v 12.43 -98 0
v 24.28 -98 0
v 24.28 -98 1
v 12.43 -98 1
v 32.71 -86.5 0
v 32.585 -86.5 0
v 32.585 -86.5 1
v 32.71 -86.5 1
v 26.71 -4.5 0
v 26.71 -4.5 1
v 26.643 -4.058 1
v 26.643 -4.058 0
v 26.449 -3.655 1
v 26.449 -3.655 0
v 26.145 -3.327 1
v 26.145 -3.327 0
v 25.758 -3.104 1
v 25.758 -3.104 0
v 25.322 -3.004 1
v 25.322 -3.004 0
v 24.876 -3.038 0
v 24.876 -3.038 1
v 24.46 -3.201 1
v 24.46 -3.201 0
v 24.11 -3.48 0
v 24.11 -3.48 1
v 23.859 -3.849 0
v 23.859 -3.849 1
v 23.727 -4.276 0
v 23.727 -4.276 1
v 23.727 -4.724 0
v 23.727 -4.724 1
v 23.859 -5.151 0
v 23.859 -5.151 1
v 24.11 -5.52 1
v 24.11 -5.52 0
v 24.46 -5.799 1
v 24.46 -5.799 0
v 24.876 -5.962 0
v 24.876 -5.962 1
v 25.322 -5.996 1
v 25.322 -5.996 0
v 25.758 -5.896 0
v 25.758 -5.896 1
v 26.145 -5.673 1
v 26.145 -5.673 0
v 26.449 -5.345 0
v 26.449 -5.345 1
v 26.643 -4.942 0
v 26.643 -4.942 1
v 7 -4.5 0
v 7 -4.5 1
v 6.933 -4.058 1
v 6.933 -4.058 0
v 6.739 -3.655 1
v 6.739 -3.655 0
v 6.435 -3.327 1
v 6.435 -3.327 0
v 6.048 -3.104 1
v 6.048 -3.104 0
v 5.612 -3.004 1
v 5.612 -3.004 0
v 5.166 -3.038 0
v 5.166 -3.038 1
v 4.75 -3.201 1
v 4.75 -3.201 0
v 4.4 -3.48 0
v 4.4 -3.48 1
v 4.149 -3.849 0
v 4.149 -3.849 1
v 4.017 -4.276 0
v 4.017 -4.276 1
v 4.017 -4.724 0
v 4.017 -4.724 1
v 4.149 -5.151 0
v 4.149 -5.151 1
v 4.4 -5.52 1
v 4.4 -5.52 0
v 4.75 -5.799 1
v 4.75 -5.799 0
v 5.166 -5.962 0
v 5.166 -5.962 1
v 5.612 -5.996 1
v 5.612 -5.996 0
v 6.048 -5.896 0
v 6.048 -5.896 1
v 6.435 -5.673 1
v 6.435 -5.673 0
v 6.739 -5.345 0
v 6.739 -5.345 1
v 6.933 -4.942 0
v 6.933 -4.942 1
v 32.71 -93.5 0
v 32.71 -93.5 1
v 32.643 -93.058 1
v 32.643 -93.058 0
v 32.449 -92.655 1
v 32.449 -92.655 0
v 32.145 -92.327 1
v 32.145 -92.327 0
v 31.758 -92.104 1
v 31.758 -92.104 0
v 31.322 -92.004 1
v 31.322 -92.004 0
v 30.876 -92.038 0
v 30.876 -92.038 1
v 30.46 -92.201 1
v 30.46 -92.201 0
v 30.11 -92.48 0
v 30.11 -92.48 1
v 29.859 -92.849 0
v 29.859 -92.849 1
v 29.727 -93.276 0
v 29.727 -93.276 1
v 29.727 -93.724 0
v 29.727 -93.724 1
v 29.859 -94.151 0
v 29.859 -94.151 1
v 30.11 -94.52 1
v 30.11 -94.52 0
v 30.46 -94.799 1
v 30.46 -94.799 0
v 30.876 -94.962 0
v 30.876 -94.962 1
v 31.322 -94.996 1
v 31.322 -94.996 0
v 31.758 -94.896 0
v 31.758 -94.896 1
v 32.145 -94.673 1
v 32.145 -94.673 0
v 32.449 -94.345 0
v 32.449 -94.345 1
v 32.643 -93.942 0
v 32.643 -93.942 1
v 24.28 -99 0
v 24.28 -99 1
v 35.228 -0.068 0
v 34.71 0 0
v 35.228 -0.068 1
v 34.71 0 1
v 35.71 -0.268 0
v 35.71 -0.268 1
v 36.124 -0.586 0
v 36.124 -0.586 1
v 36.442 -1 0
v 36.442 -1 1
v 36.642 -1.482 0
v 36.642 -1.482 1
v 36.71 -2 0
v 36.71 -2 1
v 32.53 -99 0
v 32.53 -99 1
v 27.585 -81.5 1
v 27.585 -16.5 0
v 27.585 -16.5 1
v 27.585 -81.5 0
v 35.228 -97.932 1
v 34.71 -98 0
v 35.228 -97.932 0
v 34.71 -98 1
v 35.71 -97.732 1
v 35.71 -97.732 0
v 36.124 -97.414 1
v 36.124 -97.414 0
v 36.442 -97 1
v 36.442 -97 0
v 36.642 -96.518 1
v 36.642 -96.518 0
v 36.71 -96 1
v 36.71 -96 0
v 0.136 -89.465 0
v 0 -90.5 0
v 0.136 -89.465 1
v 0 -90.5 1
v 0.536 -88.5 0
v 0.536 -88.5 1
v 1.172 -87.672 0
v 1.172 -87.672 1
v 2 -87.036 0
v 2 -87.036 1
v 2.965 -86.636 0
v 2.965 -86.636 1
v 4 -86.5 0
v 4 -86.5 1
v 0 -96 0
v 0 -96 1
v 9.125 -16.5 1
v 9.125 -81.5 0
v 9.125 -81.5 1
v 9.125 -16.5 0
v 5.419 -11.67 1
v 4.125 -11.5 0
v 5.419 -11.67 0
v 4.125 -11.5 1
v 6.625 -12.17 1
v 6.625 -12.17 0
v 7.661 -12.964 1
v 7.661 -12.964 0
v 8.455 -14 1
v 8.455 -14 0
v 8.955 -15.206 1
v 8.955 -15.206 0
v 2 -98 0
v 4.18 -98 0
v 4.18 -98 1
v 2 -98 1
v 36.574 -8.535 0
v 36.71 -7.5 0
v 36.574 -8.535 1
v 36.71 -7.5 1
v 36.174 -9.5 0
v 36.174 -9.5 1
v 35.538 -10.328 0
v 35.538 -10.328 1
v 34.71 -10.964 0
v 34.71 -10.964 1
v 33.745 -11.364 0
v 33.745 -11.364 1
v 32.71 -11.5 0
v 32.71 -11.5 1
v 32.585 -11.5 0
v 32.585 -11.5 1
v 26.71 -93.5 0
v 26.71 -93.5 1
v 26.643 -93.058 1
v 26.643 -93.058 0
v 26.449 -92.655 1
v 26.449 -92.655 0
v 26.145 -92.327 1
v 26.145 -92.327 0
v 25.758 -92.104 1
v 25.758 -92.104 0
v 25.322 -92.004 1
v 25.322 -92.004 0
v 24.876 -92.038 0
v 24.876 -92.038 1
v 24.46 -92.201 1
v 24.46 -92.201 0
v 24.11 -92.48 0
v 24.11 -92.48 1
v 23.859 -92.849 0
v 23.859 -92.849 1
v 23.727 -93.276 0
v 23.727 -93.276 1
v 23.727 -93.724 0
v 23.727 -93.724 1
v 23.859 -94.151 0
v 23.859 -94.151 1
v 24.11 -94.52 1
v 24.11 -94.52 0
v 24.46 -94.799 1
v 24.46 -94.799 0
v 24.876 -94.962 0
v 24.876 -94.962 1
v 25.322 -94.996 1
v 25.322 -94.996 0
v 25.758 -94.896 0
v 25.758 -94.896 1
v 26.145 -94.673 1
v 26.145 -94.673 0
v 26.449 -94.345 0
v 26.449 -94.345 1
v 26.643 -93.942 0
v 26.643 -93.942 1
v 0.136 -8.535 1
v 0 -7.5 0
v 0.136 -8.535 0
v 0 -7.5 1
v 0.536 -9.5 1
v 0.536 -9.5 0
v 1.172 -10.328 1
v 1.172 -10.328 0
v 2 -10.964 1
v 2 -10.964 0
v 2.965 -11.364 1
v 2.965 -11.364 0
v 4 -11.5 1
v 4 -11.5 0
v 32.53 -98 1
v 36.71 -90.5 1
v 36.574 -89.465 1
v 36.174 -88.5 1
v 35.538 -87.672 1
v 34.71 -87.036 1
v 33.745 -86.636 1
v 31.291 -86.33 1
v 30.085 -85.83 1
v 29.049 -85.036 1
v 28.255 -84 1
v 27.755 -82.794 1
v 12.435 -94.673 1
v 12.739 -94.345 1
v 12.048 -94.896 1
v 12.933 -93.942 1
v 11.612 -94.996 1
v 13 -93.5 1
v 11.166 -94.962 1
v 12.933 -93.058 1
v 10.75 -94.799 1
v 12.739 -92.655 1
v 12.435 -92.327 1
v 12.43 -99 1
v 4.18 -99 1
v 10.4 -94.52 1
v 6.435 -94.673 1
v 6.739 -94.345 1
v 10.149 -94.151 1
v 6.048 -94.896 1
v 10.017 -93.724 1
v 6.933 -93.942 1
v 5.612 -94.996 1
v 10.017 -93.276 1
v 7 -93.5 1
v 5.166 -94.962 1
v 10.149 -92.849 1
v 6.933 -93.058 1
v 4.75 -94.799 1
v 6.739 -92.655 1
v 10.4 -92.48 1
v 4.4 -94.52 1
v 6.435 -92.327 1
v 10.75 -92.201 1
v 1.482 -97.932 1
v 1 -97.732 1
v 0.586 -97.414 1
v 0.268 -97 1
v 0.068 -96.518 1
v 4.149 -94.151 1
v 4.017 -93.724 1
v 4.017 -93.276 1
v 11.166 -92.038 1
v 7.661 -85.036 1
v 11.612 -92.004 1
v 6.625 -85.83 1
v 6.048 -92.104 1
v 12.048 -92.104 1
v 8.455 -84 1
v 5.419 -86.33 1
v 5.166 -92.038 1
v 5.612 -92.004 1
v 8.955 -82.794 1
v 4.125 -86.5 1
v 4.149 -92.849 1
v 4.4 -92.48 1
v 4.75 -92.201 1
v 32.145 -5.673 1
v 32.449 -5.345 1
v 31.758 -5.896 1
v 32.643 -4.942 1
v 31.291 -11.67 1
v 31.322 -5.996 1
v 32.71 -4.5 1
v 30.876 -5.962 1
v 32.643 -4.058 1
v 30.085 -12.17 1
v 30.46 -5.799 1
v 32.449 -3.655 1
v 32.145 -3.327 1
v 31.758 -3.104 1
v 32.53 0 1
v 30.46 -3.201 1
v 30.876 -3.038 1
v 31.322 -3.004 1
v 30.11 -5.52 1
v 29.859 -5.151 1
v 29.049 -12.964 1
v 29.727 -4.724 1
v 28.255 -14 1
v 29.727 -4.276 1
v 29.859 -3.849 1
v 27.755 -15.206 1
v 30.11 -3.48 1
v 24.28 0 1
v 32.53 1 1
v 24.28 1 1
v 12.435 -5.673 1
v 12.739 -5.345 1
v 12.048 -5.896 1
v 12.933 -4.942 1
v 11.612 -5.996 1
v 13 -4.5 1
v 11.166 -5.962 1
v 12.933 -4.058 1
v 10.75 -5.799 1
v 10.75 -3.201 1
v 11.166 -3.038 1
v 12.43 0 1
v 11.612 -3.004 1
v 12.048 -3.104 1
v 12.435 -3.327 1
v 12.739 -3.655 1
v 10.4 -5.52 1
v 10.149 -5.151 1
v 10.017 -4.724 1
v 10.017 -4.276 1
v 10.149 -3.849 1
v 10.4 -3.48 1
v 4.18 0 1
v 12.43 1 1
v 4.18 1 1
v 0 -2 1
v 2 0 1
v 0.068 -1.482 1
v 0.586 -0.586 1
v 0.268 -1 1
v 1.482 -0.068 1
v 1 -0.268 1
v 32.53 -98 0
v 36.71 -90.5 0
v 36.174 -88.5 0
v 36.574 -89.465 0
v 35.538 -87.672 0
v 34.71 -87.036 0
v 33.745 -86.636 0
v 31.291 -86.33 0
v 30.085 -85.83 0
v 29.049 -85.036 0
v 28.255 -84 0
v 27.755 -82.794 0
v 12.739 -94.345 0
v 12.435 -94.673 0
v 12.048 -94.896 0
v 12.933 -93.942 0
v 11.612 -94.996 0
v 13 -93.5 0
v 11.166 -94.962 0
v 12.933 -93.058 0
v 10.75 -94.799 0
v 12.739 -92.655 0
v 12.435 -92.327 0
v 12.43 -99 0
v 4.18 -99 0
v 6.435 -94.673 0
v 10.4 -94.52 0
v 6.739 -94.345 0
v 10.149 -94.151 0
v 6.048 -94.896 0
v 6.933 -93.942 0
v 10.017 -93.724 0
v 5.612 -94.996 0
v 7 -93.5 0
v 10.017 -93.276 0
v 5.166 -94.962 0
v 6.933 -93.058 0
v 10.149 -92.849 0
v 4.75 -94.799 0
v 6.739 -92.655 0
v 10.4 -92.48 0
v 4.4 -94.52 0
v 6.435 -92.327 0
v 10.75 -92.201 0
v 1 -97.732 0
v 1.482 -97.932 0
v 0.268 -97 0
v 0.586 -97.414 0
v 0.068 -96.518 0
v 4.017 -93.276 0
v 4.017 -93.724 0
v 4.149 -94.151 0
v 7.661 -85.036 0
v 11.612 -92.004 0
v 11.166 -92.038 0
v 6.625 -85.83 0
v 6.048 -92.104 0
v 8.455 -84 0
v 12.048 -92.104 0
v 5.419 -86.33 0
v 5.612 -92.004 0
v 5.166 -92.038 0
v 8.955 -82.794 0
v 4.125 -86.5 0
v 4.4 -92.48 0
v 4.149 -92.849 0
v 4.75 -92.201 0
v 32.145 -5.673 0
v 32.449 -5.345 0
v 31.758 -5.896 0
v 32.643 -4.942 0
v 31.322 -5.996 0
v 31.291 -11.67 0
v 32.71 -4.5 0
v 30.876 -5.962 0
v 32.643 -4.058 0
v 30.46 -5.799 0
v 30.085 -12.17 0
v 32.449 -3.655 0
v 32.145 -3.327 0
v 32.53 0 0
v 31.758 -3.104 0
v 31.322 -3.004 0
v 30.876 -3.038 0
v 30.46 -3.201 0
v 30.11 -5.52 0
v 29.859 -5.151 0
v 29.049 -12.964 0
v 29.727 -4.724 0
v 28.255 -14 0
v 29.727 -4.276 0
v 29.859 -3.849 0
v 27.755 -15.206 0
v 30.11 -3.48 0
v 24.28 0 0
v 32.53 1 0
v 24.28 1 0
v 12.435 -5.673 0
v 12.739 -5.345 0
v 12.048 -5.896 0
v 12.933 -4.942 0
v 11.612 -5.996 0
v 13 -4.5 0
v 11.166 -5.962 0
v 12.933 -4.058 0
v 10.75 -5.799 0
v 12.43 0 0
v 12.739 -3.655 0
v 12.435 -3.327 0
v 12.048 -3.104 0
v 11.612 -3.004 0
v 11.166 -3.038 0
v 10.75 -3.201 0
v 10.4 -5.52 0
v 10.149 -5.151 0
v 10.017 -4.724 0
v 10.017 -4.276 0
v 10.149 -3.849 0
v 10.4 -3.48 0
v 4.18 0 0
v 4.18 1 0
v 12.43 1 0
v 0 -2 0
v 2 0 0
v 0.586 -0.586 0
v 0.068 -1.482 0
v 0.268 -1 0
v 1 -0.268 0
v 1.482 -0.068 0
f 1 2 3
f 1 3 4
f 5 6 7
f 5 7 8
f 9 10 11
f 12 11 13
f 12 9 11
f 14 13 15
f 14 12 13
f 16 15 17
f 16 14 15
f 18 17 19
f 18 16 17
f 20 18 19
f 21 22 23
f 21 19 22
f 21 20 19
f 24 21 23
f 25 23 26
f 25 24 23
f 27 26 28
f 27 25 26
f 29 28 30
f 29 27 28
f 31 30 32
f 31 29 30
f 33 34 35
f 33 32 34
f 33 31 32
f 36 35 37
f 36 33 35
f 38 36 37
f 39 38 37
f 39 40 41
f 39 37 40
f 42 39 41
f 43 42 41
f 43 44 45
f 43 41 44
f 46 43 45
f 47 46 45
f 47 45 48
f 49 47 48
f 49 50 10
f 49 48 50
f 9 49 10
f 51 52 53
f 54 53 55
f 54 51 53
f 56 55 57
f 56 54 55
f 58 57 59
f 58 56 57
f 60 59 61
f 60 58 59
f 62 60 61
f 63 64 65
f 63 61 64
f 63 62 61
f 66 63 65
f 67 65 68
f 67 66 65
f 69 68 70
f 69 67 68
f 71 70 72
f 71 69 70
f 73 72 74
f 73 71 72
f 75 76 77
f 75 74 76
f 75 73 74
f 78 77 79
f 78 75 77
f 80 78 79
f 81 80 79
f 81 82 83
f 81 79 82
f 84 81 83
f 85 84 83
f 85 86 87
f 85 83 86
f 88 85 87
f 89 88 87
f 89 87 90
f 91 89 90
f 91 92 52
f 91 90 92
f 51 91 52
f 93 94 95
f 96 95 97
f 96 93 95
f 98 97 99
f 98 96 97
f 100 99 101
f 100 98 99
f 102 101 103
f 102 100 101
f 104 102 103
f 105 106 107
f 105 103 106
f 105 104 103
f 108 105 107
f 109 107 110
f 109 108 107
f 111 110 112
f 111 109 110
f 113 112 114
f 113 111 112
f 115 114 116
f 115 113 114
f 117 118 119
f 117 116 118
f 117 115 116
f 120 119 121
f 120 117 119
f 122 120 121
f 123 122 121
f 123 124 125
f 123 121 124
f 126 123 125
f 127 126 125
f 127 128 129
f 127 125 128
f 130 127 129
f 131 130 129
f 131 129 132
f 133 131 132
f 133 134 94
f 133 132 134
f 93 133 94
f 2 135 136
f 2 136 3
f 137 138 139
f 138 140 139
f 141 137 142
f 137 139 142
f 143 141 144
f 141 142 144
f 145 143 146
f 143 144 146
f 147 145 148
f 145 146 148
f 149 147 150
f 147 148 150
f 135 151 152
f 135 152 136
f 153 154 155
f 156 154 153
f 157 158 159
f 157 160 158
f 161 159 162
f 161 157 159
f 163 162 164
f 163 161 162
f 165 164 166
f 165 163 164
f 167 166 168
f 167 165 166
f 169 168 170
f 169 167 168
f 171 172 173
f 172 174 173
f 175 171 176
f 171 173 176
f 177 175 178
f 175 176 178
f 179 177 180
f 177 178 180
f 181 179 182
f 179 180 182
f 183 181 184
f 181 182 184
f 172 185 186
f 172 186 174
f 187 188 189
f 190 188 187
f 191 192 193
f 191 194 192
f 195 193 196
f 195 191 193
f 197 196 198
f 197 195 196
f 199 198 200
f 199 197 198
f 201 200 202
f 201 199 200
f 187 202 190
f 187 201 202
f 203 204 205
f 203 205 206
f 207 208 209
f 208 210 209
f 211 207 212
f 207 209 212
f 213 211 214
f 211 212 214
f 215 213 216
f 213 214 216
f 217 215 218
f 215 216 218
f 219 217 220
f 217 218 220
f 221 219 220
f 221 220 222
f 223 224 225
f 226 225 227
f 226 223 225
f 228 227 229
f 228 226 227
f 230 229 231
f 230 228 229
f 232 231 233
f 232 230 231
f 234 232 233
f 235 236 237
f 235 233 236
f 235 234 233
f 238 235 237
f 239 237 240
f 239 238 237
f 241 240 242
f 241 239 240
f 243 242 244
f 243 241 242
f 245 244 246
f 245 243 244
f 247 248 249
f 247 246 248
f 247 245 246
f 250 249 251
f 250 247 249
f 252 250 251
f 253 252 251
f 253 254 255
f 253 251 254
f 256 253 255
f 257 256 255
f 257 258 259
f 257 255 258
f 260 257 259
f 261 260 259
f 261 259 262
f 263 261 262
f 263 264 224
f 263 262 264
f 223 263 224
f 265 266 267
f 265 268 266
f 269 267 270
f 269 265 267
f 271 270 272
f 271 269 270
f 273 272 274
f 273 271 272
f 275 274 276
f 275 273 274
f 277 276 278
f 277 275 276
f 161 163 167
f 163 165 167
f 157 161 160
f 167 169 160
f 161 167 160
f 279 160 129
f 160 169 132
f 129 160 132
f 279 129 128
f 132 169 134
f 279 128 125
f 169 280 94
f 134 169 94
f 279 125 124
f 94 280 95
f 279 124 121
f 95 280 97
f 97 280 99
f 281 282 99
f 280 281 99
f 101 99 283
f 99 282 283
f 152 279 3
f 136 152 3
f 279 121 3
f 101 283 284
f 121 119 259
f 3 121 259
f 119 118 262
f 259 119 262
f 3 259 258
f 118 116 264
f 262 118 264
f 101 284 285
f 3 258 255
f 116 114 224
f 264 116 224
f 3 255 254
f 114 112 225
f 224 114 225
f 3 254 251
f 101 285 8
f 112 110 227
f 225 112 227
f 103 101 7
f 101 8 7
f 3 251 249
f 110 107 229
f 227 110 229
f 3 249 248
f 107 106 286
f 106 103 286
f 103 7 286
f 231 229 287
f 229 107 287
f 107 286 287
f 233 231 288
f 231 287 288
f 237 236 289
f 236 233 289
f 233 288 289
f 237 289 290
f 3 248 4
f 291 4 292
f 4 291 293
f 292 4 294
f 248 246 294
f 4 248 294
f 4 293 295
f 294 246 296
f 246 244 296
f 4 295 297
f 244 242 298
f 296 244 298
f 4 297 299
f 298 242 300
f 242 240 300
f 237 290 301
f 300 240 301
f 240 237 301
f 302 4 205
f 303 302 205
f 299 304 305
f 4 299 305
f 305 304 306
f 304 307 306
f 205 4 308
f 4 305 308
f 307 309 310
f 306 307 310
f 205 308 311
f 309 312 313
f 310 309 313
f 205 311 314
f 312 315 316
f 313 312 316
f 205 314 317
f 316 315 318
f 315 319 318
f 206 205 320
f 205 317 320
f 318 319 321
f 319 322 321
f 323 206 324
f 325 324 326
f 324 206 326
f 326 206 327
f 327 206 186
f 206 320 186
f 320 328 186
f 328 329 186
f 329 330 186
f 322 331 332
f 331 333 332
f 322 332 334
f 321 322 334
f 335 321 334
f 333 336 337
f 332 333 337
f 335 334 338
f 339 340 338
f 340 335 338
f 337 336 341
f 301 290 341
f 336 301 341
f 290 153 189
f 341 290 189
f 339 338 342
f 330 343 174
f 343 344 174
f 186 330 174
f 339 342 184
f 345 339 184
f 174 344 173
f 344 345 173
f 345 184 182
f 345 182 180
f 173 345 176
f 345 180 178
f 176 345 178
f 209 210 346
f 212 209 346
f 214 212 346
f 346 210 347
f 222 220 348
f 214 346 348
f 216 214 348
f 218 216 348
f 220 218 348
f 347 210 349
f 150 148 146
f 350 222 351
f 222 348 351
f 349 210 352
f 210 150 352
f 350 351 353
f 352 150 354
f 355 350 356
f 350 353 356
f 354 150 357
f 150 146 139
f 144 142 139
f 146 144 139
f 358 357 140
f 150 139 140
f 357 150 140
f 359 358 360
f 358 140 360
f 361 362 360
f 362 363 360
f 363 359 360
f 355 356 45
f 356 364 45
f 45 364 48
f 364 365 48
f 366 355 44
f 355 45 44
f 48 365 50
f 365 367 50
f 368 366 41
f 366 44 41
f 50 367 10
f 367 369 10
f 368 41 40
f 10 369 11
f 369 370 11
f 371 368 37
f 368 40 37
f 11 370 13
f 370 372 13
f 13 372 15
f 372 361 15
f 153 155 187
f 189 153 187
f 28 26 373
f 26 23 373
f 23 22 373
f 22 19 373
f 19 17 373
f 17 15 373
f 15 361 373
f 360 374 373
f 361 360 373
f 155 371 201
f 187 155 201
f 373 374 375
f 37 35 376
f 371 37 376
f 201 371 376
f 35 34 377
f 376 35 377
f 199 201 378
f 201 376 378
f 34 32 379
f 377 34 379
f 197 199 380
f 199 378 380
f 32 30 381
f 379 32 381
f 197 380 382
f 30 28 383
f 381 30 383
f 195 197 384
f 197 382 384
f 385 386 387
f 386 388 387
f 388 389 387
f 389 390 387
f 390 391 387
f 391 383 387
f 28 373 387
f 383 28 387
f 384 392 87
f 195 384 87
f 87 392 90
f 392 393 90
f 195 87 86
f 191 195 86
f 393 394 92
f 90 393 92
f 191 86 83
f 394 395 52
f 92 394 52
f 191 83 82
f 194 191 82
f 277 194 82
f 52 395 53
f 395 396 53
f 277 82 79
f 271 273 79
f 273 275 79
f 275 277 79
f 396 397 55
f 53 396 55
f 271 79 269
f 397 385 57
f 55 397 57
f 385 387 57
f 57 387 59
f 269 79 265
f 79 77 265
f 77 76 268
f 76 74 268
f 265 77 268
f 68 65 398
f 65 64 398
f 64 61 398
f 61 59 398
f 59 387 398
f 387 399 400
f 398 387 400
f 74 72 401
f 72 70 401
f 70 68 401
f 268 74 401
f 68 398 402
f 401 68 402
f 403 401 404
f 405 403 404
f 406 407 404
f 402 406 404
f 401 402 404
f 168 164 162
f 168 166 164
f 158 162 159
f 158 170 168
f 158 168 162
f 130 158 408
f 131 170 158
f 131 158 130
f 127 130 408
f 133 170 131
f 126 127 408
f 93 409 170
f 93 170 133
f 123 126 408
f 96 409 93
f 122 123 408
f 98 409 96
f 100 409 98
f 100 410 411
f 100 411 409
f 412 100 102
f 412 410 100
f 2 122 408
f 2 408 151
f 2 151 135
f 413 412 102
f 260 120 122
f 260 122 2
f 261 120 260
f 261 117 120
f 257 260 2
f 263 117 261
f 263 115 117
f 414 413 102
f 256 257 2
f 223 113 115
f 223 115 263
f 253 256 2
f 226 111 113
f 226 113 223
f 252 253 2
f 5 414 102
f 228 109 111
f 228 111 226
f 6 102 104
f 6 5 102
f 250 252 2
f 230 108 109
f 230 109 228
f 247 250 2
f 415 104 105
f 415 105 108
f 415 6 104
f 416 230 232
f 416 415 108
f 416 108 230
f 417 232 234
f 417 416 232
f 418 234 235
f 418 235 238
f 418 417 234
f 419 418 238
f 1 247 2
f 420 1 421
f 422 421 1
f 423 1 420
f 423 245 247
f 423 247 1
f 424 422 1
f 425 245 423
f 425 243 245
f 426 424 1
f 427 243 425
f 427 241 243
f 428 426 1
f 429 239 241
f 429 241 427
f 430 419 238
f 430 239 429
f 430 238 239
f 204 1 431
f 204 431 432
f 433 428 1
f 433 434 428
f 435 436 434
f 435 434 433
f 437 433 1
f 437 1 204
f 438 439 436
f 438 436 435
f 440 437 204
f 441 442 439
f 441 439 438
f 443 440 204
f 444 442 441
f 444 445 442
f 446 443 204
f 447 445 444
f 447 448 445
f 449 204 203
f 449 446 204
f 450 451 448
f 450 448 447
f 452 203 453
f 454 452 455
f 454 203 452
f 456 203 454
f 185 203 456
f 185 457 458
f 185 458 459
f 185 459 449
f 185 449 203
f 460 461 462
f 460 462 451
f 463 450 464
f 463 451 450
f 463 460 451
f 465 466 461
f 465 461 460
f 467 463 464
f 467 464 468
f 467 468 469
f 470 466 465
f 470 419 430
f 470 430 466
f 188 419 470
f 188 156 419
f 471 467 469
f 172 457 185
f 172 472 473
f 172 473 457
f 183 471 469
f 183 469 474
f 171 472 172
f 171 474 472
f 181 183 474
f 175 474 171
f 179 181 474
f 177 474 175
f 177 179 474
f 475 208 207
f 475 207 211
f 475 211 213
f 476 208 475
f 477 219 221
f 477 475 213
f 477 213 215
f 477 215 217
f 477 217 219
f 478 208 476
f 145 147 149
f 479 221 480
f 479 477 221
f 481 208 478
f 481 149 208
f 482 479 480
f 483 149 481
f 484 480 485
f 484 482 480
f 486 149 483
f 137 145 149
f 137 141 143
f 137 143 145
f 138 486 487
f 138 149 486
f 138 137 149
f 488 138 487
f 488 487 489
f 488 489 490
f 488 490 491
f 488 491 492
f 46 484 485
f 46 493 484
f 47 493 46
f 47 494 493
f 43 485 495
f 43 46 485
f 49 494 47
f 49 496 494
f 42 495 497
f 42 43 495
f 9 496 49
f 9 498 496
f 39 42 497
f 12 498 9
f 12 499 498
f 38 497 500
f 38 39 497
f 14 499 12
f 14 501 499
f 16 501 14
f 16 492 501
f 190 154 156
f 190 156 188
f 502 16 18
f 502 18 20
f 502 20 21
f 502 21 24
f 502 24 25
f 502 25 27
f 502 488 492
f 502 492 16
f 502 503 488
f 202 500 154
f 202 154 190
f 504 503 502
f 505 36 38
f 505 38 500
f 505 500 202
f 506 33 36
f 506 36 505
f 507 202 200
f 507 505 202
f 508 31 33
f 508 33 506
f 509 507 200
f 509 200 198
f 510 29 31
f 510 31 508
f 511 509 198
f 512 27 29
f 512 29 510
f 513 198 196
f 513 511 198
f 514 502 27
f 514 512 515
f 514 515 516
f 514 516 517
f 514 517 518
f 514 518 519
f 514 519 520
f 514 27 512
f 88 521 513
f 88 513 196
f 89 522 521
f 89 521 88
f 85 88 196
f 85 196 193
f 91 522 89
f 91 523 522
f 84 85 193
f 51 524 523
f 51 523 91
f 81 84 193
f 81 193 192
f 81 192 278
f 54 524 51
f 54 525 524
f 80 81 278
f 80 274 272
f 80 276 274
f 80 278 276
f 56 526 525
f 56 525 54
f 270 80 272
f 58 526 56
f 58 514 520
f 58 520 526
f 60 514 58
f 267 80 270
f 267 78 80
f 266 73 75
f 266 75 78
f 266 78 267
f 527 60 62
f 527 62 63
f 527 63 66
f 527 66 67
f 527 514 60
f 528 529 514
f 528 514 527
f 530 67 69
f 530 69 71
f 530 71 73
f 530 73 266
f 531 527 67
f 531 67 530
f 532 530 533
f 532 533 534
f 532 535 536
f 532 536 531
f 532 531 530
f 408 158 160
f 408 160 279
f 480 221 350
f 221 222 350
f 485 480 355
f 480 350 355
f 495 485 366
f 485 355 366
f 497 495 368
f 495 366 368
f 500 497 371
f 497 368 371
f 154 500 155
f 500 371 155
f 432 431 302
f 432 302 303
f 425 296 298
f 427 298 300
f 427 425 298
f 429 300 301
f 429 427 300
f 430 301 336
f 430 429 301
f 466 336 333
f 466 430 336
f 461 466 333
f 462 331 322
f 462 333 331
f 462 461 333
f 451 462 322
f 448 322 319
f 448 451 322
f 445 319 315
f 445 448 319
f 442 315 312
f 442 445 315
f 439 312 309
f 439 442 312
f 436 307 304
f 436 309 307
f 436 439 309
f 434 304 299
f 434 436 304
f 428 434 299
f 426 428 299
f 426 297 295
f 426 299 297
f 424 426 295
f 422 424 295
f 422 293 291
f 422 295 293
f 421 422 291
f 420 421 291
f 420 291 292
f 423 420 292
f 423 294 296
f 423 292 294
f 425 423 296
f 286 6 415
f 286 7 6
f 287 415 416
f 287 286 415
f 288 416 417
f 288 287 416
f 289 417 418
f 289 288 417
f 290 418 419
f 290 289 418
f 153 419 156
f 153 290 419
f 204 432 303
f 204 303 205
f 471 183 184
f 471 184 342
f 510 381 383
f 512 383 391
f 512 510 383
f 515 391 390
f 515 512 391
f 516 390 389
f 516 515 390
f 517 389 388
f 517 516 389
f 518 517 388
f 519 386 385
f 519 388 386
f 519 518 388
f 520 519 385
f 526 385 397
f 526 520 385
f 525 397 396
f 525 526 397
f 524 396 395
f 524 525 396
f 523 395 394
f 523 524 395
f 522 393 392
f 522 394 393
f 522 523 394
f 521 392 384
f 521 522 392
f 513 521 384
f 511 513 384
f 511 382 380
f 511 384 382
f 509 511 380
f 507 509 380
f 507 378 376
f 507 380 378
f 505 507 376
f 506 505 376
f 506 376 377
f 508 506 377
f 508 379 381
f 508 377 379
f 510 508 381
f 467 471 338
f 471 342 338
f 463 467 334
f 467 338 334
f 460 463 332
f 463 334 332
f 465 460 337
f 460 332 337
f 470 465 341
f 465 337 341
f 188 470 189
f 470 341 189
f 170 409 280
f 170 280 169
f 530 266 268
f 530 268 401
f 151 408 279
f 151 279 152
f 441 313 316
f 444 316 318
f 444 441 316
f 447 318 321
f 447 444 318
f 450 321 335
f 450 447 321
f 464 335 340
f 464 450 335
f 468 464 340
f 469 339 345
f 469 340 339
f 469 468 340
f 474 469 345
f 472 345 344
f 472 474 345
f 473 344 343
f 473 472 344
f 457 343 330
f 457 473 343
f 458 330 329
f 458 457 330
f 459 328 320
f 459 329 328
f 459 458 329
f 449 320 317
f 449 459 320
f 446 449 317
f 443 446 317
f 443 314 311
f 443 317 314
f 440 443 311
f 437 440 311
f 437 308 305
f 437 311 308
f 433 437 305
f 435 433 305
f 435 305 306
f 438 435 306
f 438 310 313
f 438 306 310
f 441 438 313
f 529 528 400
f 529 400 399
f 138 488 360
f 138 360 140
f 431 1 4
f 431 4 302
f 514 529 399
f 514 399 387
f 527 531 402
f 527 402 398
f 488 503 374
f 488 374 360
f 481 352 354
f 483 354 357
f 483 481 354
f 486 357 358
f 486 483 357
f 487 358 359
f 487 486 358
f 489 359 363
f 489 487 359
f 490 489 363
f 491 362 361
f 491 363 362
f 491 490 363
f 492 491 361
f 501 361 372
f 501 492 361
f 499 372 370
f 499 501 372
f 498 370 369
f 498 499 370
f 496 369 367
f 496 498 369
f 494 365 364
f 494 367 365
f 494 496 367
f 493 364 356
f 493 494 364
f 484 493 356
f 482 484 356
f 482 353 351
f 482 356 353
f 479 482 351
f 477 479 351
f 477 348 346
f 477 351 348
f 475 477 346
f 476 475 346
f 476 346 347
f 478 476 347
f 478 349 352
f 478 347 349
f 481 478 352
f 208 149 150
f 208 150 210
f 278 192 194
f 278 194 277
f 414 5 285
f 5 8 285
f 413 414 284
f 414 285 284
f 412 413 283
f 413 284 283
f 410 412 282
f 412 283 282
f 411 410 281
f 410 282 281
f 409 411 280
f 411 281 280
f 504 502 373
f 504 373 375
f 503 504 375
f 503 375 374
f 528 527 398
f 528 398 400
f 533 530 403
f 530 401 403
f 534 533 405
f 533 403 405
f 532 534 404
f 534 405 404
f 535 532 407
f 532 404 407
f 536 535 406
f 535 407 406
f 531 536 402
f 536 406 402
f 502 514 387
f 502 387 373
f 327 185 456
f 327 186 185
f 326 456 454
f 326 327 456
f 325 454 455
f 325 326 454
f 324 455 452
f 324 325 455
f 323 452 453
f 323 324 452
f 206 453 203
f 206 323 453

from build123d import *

# Parameters (mm, degrees)
BOSS_EXTRUDE2_DEPTH = 1
SKETCH2_R           = 1.5
SKETCH2_R_2         = 1.499999993
CUT_EXTRUDE8_DEPTH  = 3
FILLET2_R           = 4
FILLET3_R           = 5
FILLET4_R           = 4
FILLET5_R           = 5
FILLET6_R           = 2
FILLET7_R           = 2
FILLET8_R           = 2
FILLET9_R           = 2
FILLET12_R          = 4
FILLET13_R          = 5


with BuildPart() as part:
    # Sketch1 → Boss-Extrude2 (new body)
    with BuildSketch(Plane.XY):
        Polygon((0, 0), (4.18, 0), (4.18, 1), (12.43, 1), (12.43, 0), (24.28, 0), (24.28, 1), (32.53, 1), (32.53, 0), (36.71, 0), (36.71, -11.5), (27.585, -11.5), (27.585, -86.5), (36.71, -86.5), (36.71, -98), (32.53, -98), (32.53, -99), (24.28, -99), (24.28, -98), (12.43, -98), (12.43, -99), (4.18, -99), (4.18, -98), (0, -98), (0, -86.5), (9.125, -86.5), (9.125, -11.5), (0, -11.5), align=None)
    extrude(amount=BOSS_EXTRUDE2_DEPTH)

    # Sketch2 → Cut-Extrude8 (cut)
    with BuildSketch(Plane.XY):
        with Locations((5.5, -4.499987612)):
            Circle(SKETCH2_R)
        with Locations((11.5, -4.499987612)):
            Circle(SKETCH2_R)
        with Locations((25.21, -4.5)):
            Circle(SKETCH2_R)
        with Locations((31.21, -4.5)):
            Circle(SKETCH2_R_2)
        with Locations((5.5, -93.500004994)):
            Circle(SKETCH2_R)
        with Locations((11.5, -93.500004994)):
            Circle(SKETCH2_R)
        with Locations((25.21, -93.5)):
            Circle(SKETCH2_R)
        with Locations((31.21, -93.5)):
            Circle(SKETCH2_R)
    extrude(amount=CUT_EXTRUDE8_DEPTH, mode=Mode.SUBTRACT)

    # Fillet2
    fillet2_edges = [part.edges().sort_by_distance(p)[0] for p in [
        (36.71, -86.5, 0.5),
    ]]
    fillet(fillet2_edges, radius=FILLET2_R)

    # Fillet3
    fillet3_edges = [part.edges().sort_by_distance(p)[0] for p in [
        (27.585, -86.5, 0.5),
    ]]
    fillet(fillet3_edges, radius=FILLET3_R)

    # Fillet4
    fillet4_edges = [part.edges().sort_by_distance(p)[0] for p in [
        (0, -86.5, 0.5),
    ]]
    fillet(fillet4_edges, radius=FILLET4_R)

    # Fillet5
    fillet5_edges = [part.edges().sort_by_distance(p)[0] for p in [
        (9.125, -86.5, 0.5),
    ]]
    fillet(fillet5_edges, radius=FILLET5_R)

    # Fillet6
    fillet6_edges = [part.edges().sort_by_distance(p)[0] for p in [
        (0, -98, 0.5),
    ]]
    fillet(fillet6_edges, radius=FILLET6_R)

    # Fillet7
    fillet7_edges = [part.edges().sort_by_distance(p)[0] for p in [
        (36.71, -98, 0.5),
    ]]
    fillet(fillet7_edges, radius=FILLET7_R)

    # Fillet8
    fillet8_edges = [part.edges().sort_by_distance(p)[0] for p in [
        (0, 0, 0.5),
    ]]
    fillet(fillet8_edges, radius=FILLET8_R)

    # Fillet9
    fillet9_edges = [part.edges().sort_by_distance(p)[0] for p in [
        (36.71, 0, 0.5),
    ]]
    fillet(fillet9_edges, radius=FILLET9_R)

    # Fillet12
    fillet12_edges = [part.edges().sort_by_distance(p)[0] for p in [
        (36.71, -11.5, 0.5),
        (0, -11.5, 0.5),
    ]]
    fillet(fillet12_edges, radius=FILLET12_R)

    # Fillet13
    fillet13_edges = [part.edges().sort_by_distance(p)[0] for p in [
        (27.585, -11.5, 0.5),
        (9.125, -11.5, 0.5),
    ]]
    fillet(fillet13_edges, radius=FILLET13_R)


solid = part.part
